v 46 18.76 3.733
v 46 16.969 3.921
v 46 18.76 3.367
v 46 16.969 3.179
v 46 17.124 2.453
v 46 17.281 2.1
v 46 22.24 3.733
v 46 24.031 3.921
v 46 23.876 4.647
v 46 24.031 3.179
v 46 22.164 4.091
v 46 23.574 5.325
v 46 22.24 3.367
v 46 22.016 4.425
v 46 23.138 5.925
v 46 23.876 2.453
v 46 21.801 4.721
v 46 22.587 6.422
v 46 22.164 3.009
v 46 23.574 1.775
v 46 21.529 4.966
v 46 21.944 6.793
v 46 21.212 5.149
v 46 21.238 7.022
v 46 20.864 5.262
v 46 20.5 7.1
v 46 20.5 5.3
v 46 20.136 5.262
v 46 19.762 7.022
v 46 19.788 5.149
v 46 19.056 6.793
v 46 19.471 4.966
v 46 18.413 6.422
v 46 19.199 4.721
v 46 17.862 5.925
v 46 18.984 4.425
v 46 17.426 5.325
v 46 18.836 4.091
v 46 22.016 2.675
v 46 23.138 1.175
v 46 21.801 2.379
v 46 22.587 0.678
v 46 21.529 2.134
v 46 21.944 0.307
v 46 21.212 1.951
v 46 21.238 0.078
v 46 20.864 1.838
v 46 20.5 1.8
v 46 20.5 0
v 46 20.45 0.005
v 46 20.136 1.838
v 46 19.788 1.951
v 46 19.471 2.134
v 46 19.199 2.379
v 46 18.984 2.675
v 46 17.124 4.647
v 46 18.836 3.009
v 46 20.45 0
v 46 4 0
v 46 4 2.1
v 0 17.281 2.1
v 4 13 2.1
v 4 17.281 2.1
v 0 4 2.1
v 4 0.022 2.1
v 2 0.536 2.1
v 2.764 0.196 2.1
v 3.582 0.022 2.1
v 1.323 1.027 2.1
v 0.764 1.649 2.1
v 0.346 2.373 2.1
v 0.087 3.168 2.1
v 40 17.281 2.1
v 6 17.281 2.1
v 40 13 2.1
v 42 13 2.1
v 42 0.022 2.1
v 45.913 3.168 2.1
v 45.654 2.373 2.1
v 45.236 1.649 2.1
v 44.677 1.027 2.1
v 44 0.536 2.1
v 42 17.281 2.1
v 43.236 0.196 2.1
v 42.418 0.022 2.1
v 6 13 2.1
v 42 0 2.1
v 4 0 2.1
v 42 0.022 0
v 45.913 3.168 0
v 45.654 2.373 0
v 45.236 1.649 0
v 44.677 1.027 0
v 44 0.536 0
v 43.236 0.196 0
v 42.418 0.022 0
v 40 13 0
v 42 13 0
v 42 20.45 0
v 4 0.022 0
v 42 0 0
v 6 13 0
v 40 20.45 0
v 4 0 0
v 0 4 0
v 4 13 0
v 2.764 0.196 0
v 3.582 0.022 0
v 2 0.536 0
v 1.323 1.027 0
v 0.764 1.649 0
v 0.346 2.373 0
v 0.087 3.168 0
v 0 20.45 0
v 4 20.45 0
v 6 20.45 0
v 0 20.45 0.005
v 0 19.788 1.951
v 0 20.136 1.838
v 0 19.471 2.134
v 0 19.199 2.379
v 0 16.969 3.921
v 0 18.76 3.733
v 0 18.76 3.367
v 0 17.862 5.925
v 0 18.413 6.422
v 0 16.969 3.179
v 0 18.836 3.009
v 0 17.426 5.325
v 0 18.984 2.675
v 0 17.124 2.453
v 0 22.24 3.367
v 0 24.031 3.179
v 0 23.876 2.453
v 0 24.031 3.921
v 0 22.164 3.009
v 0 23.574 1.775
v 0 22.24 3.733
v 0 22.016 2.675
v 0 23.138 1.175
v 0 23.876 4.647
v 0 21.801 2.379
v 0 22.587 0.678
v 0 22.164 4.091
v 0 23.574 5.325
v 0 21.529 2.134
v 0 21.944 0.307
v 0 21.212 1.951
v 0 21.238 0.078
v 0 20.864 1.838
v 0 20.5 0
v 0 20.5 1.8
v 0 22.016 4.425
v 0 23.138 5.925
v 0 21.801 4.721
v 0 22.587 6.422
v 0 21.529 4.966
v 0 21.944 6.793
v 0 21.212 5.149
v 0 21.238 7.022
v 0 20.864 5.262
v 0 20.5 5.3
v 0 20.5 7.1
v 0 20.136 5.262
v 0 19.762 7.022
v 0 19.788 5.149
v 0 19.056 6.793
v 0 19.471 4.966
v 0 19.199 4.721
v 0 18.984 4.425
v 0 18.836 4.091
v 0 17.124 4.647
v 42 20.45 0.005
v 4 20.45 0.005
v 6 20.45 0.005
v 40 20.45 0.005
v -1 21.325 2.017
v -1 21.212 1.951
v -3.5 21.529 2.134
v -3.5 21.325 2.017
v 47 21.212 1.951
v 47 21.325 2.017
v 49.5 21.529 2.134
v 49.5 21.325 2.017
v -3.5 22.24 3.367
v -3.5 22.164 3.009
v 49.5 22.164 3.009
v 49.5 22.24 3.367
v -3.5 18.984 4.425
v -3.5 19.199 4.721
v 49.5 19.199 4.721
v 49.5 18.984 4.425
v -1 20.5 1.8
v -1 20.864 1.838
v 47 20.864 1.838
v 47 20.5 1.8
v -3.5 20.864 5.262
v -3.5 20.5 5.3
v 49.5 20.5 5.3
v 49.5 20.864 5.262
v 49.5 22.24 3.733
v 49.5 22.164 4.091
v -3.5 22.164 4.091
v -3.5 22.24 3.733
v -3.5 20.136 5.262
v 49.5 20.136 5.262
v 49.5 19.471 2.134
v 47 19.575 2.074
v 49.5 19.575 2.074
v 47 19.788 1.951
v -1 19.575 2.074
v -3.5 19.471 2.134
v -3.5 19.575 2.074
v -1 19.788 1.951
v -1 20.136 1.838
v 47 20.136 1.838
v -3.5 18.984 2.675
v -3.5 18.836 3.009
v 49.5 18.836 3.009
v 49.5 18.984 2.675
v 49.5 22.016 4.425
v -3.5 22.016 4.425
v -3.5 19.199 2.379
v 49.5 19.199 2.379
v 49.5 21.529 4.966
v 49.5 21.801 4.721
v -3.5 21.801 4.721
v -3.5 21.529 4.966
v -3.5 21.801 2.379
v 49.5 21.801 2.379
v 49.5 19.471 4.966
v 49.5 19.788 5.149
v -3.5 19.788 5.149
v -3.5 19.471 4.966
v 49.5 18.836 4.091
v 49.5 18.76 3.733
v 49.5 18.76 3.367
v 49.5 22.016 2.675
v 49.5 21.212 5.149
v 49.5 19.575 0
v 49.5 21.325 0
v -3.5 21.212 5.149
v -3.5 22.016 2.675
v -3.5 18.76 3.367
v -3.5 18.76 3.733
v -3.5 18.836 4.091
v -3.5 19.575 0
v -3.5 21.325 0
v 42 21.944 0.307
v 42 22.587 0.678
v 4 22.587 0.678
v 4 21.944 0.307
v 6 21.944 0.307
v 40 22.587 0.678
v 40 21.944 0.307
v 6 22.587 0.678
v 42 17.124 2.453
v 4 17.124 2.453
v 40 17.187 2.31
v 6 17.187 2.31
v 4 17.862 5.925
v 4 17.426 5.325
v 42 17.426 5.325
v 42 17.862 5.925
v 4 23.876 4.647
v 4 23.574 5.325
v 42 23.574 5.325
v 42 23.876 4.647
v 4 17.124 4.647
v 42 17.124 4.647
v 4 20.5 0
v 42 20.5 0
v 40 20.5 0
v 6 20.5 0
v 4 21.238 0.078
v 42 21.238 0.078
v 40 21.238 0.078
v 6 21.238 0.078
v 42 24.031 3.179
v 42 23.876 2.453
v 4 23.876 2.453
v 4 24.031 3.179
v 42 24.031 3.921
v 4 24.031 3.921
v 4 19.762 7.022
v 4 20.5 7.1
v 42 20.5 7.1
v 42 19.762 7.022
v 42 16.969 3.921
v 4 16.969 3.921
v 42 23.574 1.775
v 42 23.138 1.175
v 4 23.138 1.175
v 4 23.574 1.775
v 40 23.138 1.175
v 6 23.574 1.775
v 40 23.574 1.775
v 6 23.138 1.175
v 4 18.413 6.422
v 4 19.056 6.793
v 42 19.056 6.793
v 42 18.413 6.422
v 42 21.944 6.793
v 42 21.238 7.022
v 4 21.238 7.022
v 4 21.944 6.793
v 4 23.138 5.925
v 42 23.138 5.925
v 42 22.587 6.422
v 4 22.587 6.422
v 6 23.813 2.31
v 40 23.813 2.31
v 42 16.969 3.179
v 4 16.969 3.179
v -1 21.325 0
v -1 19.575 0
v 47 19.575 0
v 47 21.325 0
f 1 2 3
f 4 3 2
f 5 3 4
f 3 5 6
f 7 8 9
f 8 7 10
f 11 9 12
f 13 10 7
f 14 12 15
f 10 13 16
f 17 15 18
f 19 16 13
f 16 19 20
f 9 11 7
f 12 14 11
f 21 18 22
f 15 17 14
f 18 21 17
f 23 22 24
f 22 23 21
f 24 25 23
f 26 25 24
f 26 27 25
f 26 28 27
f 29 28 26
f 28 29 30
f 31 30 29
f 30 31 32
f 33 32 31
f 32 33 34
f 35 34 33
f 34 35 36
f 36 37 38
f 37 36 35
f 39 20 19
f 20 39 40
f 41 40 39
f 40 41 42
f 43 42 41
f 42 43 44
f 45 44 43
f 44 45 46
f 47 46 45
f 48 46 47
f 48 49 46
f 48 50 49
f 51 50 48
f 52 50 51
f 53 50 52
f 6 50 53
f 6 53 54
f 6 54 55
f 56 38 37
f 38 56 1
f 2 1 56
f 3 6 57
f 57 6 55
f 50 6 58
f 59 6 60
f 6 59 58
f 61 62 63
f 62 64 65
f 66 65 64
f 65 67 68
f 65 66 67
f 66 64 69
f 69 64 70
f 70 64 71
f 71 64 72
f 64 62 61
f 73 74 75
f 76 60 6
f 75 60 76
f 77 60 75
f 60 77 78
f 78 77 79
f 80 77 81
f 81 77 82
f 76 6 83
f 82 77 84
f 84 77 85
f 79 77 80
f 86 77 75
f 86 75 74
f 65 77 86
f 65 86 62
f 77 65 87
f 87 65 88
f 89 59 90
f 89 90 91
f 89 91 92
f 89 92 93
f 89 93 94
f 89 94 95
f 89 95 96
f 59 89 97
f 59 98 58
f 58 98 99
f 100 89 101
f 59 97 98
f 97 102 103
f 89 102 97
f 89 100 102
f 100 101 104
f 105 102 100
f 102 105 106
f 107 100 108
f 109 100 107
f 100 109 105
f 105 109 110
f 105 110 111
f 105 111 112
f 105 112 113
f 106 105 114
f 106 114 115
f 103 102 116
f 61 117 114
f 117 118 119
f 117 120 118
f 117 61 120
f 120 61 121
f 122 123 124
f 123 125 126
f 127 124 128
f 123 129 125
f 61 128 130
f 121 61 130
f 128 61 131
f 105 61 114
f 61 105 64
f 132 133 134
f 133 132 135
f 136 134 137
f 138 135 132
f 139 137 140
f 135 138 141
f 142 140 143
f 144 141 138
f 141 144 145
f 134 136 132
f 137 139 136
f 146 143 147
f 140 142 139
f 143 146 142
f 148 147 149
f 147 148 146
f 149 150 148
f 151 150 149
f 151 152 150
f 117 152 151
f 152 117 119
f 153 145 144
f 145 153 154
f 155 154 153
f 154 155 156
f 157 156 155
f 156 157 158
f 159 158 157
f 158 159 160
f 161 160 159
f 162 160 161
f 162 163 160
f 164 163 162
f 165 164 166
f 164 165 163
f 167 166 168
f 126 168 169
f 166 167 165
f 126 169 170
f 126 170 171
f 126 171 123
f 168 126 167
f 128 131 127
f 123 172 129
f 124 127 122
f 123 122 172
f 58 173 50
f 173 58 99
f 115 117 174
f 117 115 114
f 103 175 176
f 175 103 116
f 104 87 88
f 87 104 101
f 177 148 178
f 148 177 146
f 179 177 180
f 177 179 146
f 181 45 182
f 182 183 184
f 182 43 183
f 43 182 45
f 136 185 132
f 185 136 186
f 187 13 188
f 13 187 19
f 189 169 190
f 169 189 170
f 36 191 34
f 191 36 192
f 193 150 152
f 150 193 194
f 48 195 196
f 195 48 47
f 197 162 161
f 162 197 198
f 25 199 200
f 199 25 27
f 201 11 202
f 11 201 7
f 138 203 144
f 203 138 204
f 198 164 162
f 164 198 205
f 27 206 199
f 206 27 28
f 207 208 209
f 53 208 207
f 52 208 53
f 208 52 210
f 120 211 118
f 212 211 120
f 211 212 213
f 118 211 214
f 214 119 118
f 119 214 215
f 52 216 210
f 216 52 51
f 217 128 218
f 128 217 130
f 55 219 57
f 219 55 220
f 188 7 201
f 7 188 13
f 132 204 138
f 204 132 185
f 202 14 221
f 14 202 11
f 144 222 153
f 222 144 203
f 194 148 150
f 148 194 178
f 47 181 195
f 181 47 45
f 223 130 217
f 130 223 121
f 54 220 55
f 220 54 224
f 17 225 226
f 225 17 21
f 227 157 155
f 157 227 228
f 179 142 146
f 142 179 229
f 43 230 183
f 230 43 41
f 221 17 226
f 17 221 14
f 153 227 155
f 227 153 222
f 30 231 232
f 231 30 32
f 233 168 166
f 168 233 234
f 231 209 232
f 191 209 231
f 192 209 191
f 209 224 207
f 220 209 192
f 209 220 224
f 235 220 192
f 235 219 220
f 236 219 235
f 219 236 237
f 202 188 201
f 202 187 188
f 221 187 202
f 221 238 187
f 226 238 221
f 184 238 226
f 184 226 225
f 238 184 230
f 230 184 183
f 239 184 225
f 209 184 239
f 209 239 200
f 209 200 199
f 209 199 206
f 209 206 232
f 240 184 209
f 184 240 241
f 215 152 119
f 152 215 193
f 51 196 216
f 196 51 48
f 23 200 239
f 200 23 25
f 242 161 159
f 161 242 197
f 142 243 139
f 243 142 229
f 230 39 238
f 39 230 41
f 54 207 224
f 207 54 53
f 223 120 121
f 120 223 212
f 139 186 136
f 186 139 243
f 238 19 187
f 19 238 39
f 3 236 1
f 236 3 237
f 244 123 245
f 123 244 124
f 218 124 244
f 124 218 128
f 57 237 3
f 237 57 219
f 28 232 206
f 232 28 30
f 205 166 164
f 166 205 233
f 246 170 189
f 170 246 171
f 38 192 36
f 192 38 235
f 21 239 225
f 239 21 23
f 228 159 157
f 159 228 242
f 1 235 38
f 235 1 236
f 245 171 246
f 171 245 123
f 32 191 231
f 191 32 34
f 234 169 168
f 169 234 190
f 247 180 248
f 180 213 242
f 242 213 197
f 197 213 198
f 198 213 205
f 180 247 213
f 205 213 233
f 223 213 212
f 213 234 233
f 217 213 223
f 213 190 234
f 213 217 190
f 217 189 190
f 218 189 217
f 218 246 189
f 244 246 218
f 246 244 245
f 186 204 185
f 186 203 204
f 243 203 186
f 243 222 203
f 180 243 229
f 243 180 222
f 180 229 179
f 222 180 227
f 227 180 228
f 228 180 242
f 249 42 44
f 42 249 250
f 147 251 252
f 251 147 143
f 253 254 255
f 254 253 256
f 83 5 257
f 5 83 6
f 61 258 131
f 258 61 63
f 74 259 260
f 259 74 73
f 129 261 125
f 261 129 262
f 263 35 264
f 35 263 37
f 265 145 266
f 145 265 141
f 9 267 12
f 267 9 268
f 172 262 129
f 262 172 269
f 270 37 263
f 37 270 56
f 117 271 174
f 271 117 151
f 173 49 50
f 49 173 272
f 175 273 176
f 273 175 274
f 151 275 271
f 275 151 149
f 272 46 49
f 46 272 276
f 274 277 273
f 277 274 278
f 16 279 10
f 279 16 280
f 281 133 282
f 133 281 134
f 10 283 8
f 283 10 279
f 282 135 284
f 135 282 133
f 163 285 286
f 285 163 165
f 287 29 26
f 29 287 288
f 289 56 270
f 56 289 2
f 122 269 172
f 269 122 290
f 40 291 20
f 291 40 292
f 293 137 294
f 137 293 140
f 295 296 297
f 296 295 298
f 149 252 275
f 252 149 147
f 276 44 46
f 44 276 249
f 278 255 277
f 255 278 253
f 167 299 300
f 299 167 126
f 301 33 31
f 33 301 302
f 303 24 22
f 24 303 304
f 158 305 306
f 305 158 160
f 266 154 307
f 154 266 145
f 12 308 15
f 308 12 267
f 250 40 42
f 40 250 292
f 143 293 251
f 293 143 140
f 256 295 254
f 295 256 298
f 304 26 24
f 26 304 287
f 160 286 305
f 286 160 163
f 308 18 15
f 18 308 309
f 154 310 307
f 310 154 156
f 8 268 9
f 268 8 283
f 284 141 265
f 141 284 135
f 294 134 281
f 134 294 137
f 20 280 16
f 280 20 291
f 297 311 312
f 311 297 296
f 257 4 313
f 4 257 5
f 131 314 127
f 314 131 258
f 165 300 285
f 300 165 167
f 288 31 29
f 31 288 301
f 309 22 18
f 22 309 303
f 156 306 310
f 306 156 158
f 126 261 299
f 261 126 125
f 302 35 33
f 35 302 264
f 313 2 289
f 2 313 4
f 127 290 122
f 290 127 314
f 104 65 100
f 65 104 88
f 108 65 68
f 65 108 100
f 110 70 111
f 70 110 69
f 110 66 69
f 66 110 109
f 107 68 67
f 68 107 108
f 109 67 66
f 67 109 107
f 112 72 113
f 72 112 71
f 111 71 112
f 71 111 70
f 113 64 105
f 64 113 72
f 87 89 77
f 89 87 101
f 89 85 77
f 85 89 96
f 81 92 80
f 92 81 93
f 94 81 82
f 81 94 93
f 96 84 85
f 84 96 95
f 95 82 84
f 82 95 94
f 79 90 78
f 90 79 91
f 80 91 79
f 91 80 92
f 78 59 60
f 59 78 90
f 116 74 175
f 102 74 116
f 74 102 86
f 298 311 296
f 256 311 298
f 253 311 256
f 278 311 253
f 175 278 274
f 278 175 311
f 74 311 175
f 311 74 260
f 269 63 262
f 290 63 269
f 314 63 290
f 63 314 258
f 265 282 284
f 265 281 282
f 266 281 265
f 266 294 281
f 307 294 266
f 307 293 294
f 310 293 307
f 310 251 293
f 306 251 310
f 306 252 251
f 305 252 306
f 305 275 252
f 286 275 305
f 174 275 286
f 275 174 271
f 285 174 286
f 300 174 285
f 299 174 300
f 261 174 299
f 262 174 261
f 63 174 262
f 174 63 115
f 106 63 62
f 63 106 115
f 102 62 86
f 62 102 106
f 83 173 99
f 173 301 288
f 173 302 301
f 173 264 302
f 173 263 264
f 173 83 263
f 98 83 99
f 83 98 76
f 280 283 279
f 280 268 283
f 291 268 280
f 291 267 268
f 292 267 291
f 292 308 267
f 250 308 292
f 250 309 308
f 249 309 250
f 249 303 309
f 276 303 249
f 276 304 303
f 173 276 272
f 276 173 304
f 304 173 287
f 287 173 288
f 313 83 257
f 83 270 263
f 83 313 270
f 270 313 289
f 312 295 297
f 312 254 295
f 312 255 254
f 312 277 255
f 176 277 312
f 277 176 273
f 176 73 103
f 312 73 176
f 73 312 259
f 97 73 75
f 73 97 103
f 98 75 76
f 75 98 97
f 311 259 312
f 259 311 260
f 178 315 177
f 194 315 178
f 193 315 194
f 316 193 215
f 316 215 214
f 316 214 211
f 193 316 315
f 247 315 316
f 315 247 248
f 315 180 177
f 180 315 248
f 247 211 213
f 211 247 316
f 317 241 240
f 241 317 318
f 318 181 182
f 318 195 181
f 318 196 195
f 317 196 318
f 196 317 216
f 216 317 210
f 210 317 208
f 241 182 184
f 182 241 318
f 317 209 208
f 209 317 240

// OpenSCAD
//Length of Leg
Length=46;
//Depth of Leg
Depth=24;
//Thickness at narrow side
Thickness=2.1;
//Corner radius
Corner_Radius=4;
//Length of cut away section
Leg_Length=11;
//Width of cut away section
Leg_Width=4;
// Complete height of leg
Total_Height=5.3;
//Diameter of pin
Pin_Diameter=3.5;
//Length of pin
Pin_Length=3.5;
//Height of pinn from bottom of foot
Pin_Height=1.8;
//Gap for pin support structure
Pin_Support_Gap=1;

difference(){
	union(){
		cube([Length,Depth-Pin_Diameter/2-Pin_Height,Thickness]);
		translate([-Pin_Length,Depth-Pin_Length,Pin_Height+Pin_Diameter/2])rotate(a=[0,90-0])cylinder(r=Pin_Diameter/2,h=Length+Pin_Length*2,$fn=30);
		translate([0,Depth-Pin_Length,Pin_Height+Pin_Diameter/2])rotate(a=[0,90-0])cylinder(r=Pin_Diameter/2+Pin_Height,h=Length,$fn=30);
	}
	difference(){
		translate([-Thickness,-Thickness,-Thickness/2])cube([Corner_Radius+Thickness,Corner_Radius+Thickness,Thickness*2]);
		translate([Corner_Radius,Corner_Radius,-Thickness])cylinder(r=Corner_Radius,h=Thickness*3,$fn=30);
	}
	translate([Length,0,0]){
		mirror([1,0,0]){
			difference(){
				translate([-Thickness,-Thickness,-Thickness/2])cube([Corner_Radius+Thickness,Corner_Radius+Thickness,Thickness*2]);
				translate([Corner_Radius,Corner_Radius,-Thickness])cylinder(r=Corner_Radius,h=Thickness*3,$fn=30);
			}
		}
	}
	translate([Leg_Width,Depth-Leg_Length,-Total_Height])cube([Leg_Width/2,Leg_Length*2,Total_Height*2+Pin_Diameter+Pin_Height*2]);
	translate([Length-Leg_Width*1.5,Depth-Leg_Length,-Total_Height])cube([Leg_Width/2,Leg_Length*2,Total_Height*2+Pin_Diameter+Pin_Height*2]);
	translate([Leg_Width,Leg_Width,Thickness*1.1])cube([Length-Leg_Width*2,Depth,Pin_Diameter+Pin_Height*2]);
}
translate([-Pin_Length,Depth-Pin_Diameter*.75-Pin_Height,0])cube([Pin_Length-Pin_Support_Gap,Pin_Diameter/2,Pin_Diameter/2+Pin_Height]);
translate([Length+Pin_Support_Gap,Depth-Pin_Diameter*.75-Pin_Height,0])cube([Pin_Length-Pin_Support_Gap,Pin_Diameter/2,Pin_Diameter/2+Pin_Height]);
